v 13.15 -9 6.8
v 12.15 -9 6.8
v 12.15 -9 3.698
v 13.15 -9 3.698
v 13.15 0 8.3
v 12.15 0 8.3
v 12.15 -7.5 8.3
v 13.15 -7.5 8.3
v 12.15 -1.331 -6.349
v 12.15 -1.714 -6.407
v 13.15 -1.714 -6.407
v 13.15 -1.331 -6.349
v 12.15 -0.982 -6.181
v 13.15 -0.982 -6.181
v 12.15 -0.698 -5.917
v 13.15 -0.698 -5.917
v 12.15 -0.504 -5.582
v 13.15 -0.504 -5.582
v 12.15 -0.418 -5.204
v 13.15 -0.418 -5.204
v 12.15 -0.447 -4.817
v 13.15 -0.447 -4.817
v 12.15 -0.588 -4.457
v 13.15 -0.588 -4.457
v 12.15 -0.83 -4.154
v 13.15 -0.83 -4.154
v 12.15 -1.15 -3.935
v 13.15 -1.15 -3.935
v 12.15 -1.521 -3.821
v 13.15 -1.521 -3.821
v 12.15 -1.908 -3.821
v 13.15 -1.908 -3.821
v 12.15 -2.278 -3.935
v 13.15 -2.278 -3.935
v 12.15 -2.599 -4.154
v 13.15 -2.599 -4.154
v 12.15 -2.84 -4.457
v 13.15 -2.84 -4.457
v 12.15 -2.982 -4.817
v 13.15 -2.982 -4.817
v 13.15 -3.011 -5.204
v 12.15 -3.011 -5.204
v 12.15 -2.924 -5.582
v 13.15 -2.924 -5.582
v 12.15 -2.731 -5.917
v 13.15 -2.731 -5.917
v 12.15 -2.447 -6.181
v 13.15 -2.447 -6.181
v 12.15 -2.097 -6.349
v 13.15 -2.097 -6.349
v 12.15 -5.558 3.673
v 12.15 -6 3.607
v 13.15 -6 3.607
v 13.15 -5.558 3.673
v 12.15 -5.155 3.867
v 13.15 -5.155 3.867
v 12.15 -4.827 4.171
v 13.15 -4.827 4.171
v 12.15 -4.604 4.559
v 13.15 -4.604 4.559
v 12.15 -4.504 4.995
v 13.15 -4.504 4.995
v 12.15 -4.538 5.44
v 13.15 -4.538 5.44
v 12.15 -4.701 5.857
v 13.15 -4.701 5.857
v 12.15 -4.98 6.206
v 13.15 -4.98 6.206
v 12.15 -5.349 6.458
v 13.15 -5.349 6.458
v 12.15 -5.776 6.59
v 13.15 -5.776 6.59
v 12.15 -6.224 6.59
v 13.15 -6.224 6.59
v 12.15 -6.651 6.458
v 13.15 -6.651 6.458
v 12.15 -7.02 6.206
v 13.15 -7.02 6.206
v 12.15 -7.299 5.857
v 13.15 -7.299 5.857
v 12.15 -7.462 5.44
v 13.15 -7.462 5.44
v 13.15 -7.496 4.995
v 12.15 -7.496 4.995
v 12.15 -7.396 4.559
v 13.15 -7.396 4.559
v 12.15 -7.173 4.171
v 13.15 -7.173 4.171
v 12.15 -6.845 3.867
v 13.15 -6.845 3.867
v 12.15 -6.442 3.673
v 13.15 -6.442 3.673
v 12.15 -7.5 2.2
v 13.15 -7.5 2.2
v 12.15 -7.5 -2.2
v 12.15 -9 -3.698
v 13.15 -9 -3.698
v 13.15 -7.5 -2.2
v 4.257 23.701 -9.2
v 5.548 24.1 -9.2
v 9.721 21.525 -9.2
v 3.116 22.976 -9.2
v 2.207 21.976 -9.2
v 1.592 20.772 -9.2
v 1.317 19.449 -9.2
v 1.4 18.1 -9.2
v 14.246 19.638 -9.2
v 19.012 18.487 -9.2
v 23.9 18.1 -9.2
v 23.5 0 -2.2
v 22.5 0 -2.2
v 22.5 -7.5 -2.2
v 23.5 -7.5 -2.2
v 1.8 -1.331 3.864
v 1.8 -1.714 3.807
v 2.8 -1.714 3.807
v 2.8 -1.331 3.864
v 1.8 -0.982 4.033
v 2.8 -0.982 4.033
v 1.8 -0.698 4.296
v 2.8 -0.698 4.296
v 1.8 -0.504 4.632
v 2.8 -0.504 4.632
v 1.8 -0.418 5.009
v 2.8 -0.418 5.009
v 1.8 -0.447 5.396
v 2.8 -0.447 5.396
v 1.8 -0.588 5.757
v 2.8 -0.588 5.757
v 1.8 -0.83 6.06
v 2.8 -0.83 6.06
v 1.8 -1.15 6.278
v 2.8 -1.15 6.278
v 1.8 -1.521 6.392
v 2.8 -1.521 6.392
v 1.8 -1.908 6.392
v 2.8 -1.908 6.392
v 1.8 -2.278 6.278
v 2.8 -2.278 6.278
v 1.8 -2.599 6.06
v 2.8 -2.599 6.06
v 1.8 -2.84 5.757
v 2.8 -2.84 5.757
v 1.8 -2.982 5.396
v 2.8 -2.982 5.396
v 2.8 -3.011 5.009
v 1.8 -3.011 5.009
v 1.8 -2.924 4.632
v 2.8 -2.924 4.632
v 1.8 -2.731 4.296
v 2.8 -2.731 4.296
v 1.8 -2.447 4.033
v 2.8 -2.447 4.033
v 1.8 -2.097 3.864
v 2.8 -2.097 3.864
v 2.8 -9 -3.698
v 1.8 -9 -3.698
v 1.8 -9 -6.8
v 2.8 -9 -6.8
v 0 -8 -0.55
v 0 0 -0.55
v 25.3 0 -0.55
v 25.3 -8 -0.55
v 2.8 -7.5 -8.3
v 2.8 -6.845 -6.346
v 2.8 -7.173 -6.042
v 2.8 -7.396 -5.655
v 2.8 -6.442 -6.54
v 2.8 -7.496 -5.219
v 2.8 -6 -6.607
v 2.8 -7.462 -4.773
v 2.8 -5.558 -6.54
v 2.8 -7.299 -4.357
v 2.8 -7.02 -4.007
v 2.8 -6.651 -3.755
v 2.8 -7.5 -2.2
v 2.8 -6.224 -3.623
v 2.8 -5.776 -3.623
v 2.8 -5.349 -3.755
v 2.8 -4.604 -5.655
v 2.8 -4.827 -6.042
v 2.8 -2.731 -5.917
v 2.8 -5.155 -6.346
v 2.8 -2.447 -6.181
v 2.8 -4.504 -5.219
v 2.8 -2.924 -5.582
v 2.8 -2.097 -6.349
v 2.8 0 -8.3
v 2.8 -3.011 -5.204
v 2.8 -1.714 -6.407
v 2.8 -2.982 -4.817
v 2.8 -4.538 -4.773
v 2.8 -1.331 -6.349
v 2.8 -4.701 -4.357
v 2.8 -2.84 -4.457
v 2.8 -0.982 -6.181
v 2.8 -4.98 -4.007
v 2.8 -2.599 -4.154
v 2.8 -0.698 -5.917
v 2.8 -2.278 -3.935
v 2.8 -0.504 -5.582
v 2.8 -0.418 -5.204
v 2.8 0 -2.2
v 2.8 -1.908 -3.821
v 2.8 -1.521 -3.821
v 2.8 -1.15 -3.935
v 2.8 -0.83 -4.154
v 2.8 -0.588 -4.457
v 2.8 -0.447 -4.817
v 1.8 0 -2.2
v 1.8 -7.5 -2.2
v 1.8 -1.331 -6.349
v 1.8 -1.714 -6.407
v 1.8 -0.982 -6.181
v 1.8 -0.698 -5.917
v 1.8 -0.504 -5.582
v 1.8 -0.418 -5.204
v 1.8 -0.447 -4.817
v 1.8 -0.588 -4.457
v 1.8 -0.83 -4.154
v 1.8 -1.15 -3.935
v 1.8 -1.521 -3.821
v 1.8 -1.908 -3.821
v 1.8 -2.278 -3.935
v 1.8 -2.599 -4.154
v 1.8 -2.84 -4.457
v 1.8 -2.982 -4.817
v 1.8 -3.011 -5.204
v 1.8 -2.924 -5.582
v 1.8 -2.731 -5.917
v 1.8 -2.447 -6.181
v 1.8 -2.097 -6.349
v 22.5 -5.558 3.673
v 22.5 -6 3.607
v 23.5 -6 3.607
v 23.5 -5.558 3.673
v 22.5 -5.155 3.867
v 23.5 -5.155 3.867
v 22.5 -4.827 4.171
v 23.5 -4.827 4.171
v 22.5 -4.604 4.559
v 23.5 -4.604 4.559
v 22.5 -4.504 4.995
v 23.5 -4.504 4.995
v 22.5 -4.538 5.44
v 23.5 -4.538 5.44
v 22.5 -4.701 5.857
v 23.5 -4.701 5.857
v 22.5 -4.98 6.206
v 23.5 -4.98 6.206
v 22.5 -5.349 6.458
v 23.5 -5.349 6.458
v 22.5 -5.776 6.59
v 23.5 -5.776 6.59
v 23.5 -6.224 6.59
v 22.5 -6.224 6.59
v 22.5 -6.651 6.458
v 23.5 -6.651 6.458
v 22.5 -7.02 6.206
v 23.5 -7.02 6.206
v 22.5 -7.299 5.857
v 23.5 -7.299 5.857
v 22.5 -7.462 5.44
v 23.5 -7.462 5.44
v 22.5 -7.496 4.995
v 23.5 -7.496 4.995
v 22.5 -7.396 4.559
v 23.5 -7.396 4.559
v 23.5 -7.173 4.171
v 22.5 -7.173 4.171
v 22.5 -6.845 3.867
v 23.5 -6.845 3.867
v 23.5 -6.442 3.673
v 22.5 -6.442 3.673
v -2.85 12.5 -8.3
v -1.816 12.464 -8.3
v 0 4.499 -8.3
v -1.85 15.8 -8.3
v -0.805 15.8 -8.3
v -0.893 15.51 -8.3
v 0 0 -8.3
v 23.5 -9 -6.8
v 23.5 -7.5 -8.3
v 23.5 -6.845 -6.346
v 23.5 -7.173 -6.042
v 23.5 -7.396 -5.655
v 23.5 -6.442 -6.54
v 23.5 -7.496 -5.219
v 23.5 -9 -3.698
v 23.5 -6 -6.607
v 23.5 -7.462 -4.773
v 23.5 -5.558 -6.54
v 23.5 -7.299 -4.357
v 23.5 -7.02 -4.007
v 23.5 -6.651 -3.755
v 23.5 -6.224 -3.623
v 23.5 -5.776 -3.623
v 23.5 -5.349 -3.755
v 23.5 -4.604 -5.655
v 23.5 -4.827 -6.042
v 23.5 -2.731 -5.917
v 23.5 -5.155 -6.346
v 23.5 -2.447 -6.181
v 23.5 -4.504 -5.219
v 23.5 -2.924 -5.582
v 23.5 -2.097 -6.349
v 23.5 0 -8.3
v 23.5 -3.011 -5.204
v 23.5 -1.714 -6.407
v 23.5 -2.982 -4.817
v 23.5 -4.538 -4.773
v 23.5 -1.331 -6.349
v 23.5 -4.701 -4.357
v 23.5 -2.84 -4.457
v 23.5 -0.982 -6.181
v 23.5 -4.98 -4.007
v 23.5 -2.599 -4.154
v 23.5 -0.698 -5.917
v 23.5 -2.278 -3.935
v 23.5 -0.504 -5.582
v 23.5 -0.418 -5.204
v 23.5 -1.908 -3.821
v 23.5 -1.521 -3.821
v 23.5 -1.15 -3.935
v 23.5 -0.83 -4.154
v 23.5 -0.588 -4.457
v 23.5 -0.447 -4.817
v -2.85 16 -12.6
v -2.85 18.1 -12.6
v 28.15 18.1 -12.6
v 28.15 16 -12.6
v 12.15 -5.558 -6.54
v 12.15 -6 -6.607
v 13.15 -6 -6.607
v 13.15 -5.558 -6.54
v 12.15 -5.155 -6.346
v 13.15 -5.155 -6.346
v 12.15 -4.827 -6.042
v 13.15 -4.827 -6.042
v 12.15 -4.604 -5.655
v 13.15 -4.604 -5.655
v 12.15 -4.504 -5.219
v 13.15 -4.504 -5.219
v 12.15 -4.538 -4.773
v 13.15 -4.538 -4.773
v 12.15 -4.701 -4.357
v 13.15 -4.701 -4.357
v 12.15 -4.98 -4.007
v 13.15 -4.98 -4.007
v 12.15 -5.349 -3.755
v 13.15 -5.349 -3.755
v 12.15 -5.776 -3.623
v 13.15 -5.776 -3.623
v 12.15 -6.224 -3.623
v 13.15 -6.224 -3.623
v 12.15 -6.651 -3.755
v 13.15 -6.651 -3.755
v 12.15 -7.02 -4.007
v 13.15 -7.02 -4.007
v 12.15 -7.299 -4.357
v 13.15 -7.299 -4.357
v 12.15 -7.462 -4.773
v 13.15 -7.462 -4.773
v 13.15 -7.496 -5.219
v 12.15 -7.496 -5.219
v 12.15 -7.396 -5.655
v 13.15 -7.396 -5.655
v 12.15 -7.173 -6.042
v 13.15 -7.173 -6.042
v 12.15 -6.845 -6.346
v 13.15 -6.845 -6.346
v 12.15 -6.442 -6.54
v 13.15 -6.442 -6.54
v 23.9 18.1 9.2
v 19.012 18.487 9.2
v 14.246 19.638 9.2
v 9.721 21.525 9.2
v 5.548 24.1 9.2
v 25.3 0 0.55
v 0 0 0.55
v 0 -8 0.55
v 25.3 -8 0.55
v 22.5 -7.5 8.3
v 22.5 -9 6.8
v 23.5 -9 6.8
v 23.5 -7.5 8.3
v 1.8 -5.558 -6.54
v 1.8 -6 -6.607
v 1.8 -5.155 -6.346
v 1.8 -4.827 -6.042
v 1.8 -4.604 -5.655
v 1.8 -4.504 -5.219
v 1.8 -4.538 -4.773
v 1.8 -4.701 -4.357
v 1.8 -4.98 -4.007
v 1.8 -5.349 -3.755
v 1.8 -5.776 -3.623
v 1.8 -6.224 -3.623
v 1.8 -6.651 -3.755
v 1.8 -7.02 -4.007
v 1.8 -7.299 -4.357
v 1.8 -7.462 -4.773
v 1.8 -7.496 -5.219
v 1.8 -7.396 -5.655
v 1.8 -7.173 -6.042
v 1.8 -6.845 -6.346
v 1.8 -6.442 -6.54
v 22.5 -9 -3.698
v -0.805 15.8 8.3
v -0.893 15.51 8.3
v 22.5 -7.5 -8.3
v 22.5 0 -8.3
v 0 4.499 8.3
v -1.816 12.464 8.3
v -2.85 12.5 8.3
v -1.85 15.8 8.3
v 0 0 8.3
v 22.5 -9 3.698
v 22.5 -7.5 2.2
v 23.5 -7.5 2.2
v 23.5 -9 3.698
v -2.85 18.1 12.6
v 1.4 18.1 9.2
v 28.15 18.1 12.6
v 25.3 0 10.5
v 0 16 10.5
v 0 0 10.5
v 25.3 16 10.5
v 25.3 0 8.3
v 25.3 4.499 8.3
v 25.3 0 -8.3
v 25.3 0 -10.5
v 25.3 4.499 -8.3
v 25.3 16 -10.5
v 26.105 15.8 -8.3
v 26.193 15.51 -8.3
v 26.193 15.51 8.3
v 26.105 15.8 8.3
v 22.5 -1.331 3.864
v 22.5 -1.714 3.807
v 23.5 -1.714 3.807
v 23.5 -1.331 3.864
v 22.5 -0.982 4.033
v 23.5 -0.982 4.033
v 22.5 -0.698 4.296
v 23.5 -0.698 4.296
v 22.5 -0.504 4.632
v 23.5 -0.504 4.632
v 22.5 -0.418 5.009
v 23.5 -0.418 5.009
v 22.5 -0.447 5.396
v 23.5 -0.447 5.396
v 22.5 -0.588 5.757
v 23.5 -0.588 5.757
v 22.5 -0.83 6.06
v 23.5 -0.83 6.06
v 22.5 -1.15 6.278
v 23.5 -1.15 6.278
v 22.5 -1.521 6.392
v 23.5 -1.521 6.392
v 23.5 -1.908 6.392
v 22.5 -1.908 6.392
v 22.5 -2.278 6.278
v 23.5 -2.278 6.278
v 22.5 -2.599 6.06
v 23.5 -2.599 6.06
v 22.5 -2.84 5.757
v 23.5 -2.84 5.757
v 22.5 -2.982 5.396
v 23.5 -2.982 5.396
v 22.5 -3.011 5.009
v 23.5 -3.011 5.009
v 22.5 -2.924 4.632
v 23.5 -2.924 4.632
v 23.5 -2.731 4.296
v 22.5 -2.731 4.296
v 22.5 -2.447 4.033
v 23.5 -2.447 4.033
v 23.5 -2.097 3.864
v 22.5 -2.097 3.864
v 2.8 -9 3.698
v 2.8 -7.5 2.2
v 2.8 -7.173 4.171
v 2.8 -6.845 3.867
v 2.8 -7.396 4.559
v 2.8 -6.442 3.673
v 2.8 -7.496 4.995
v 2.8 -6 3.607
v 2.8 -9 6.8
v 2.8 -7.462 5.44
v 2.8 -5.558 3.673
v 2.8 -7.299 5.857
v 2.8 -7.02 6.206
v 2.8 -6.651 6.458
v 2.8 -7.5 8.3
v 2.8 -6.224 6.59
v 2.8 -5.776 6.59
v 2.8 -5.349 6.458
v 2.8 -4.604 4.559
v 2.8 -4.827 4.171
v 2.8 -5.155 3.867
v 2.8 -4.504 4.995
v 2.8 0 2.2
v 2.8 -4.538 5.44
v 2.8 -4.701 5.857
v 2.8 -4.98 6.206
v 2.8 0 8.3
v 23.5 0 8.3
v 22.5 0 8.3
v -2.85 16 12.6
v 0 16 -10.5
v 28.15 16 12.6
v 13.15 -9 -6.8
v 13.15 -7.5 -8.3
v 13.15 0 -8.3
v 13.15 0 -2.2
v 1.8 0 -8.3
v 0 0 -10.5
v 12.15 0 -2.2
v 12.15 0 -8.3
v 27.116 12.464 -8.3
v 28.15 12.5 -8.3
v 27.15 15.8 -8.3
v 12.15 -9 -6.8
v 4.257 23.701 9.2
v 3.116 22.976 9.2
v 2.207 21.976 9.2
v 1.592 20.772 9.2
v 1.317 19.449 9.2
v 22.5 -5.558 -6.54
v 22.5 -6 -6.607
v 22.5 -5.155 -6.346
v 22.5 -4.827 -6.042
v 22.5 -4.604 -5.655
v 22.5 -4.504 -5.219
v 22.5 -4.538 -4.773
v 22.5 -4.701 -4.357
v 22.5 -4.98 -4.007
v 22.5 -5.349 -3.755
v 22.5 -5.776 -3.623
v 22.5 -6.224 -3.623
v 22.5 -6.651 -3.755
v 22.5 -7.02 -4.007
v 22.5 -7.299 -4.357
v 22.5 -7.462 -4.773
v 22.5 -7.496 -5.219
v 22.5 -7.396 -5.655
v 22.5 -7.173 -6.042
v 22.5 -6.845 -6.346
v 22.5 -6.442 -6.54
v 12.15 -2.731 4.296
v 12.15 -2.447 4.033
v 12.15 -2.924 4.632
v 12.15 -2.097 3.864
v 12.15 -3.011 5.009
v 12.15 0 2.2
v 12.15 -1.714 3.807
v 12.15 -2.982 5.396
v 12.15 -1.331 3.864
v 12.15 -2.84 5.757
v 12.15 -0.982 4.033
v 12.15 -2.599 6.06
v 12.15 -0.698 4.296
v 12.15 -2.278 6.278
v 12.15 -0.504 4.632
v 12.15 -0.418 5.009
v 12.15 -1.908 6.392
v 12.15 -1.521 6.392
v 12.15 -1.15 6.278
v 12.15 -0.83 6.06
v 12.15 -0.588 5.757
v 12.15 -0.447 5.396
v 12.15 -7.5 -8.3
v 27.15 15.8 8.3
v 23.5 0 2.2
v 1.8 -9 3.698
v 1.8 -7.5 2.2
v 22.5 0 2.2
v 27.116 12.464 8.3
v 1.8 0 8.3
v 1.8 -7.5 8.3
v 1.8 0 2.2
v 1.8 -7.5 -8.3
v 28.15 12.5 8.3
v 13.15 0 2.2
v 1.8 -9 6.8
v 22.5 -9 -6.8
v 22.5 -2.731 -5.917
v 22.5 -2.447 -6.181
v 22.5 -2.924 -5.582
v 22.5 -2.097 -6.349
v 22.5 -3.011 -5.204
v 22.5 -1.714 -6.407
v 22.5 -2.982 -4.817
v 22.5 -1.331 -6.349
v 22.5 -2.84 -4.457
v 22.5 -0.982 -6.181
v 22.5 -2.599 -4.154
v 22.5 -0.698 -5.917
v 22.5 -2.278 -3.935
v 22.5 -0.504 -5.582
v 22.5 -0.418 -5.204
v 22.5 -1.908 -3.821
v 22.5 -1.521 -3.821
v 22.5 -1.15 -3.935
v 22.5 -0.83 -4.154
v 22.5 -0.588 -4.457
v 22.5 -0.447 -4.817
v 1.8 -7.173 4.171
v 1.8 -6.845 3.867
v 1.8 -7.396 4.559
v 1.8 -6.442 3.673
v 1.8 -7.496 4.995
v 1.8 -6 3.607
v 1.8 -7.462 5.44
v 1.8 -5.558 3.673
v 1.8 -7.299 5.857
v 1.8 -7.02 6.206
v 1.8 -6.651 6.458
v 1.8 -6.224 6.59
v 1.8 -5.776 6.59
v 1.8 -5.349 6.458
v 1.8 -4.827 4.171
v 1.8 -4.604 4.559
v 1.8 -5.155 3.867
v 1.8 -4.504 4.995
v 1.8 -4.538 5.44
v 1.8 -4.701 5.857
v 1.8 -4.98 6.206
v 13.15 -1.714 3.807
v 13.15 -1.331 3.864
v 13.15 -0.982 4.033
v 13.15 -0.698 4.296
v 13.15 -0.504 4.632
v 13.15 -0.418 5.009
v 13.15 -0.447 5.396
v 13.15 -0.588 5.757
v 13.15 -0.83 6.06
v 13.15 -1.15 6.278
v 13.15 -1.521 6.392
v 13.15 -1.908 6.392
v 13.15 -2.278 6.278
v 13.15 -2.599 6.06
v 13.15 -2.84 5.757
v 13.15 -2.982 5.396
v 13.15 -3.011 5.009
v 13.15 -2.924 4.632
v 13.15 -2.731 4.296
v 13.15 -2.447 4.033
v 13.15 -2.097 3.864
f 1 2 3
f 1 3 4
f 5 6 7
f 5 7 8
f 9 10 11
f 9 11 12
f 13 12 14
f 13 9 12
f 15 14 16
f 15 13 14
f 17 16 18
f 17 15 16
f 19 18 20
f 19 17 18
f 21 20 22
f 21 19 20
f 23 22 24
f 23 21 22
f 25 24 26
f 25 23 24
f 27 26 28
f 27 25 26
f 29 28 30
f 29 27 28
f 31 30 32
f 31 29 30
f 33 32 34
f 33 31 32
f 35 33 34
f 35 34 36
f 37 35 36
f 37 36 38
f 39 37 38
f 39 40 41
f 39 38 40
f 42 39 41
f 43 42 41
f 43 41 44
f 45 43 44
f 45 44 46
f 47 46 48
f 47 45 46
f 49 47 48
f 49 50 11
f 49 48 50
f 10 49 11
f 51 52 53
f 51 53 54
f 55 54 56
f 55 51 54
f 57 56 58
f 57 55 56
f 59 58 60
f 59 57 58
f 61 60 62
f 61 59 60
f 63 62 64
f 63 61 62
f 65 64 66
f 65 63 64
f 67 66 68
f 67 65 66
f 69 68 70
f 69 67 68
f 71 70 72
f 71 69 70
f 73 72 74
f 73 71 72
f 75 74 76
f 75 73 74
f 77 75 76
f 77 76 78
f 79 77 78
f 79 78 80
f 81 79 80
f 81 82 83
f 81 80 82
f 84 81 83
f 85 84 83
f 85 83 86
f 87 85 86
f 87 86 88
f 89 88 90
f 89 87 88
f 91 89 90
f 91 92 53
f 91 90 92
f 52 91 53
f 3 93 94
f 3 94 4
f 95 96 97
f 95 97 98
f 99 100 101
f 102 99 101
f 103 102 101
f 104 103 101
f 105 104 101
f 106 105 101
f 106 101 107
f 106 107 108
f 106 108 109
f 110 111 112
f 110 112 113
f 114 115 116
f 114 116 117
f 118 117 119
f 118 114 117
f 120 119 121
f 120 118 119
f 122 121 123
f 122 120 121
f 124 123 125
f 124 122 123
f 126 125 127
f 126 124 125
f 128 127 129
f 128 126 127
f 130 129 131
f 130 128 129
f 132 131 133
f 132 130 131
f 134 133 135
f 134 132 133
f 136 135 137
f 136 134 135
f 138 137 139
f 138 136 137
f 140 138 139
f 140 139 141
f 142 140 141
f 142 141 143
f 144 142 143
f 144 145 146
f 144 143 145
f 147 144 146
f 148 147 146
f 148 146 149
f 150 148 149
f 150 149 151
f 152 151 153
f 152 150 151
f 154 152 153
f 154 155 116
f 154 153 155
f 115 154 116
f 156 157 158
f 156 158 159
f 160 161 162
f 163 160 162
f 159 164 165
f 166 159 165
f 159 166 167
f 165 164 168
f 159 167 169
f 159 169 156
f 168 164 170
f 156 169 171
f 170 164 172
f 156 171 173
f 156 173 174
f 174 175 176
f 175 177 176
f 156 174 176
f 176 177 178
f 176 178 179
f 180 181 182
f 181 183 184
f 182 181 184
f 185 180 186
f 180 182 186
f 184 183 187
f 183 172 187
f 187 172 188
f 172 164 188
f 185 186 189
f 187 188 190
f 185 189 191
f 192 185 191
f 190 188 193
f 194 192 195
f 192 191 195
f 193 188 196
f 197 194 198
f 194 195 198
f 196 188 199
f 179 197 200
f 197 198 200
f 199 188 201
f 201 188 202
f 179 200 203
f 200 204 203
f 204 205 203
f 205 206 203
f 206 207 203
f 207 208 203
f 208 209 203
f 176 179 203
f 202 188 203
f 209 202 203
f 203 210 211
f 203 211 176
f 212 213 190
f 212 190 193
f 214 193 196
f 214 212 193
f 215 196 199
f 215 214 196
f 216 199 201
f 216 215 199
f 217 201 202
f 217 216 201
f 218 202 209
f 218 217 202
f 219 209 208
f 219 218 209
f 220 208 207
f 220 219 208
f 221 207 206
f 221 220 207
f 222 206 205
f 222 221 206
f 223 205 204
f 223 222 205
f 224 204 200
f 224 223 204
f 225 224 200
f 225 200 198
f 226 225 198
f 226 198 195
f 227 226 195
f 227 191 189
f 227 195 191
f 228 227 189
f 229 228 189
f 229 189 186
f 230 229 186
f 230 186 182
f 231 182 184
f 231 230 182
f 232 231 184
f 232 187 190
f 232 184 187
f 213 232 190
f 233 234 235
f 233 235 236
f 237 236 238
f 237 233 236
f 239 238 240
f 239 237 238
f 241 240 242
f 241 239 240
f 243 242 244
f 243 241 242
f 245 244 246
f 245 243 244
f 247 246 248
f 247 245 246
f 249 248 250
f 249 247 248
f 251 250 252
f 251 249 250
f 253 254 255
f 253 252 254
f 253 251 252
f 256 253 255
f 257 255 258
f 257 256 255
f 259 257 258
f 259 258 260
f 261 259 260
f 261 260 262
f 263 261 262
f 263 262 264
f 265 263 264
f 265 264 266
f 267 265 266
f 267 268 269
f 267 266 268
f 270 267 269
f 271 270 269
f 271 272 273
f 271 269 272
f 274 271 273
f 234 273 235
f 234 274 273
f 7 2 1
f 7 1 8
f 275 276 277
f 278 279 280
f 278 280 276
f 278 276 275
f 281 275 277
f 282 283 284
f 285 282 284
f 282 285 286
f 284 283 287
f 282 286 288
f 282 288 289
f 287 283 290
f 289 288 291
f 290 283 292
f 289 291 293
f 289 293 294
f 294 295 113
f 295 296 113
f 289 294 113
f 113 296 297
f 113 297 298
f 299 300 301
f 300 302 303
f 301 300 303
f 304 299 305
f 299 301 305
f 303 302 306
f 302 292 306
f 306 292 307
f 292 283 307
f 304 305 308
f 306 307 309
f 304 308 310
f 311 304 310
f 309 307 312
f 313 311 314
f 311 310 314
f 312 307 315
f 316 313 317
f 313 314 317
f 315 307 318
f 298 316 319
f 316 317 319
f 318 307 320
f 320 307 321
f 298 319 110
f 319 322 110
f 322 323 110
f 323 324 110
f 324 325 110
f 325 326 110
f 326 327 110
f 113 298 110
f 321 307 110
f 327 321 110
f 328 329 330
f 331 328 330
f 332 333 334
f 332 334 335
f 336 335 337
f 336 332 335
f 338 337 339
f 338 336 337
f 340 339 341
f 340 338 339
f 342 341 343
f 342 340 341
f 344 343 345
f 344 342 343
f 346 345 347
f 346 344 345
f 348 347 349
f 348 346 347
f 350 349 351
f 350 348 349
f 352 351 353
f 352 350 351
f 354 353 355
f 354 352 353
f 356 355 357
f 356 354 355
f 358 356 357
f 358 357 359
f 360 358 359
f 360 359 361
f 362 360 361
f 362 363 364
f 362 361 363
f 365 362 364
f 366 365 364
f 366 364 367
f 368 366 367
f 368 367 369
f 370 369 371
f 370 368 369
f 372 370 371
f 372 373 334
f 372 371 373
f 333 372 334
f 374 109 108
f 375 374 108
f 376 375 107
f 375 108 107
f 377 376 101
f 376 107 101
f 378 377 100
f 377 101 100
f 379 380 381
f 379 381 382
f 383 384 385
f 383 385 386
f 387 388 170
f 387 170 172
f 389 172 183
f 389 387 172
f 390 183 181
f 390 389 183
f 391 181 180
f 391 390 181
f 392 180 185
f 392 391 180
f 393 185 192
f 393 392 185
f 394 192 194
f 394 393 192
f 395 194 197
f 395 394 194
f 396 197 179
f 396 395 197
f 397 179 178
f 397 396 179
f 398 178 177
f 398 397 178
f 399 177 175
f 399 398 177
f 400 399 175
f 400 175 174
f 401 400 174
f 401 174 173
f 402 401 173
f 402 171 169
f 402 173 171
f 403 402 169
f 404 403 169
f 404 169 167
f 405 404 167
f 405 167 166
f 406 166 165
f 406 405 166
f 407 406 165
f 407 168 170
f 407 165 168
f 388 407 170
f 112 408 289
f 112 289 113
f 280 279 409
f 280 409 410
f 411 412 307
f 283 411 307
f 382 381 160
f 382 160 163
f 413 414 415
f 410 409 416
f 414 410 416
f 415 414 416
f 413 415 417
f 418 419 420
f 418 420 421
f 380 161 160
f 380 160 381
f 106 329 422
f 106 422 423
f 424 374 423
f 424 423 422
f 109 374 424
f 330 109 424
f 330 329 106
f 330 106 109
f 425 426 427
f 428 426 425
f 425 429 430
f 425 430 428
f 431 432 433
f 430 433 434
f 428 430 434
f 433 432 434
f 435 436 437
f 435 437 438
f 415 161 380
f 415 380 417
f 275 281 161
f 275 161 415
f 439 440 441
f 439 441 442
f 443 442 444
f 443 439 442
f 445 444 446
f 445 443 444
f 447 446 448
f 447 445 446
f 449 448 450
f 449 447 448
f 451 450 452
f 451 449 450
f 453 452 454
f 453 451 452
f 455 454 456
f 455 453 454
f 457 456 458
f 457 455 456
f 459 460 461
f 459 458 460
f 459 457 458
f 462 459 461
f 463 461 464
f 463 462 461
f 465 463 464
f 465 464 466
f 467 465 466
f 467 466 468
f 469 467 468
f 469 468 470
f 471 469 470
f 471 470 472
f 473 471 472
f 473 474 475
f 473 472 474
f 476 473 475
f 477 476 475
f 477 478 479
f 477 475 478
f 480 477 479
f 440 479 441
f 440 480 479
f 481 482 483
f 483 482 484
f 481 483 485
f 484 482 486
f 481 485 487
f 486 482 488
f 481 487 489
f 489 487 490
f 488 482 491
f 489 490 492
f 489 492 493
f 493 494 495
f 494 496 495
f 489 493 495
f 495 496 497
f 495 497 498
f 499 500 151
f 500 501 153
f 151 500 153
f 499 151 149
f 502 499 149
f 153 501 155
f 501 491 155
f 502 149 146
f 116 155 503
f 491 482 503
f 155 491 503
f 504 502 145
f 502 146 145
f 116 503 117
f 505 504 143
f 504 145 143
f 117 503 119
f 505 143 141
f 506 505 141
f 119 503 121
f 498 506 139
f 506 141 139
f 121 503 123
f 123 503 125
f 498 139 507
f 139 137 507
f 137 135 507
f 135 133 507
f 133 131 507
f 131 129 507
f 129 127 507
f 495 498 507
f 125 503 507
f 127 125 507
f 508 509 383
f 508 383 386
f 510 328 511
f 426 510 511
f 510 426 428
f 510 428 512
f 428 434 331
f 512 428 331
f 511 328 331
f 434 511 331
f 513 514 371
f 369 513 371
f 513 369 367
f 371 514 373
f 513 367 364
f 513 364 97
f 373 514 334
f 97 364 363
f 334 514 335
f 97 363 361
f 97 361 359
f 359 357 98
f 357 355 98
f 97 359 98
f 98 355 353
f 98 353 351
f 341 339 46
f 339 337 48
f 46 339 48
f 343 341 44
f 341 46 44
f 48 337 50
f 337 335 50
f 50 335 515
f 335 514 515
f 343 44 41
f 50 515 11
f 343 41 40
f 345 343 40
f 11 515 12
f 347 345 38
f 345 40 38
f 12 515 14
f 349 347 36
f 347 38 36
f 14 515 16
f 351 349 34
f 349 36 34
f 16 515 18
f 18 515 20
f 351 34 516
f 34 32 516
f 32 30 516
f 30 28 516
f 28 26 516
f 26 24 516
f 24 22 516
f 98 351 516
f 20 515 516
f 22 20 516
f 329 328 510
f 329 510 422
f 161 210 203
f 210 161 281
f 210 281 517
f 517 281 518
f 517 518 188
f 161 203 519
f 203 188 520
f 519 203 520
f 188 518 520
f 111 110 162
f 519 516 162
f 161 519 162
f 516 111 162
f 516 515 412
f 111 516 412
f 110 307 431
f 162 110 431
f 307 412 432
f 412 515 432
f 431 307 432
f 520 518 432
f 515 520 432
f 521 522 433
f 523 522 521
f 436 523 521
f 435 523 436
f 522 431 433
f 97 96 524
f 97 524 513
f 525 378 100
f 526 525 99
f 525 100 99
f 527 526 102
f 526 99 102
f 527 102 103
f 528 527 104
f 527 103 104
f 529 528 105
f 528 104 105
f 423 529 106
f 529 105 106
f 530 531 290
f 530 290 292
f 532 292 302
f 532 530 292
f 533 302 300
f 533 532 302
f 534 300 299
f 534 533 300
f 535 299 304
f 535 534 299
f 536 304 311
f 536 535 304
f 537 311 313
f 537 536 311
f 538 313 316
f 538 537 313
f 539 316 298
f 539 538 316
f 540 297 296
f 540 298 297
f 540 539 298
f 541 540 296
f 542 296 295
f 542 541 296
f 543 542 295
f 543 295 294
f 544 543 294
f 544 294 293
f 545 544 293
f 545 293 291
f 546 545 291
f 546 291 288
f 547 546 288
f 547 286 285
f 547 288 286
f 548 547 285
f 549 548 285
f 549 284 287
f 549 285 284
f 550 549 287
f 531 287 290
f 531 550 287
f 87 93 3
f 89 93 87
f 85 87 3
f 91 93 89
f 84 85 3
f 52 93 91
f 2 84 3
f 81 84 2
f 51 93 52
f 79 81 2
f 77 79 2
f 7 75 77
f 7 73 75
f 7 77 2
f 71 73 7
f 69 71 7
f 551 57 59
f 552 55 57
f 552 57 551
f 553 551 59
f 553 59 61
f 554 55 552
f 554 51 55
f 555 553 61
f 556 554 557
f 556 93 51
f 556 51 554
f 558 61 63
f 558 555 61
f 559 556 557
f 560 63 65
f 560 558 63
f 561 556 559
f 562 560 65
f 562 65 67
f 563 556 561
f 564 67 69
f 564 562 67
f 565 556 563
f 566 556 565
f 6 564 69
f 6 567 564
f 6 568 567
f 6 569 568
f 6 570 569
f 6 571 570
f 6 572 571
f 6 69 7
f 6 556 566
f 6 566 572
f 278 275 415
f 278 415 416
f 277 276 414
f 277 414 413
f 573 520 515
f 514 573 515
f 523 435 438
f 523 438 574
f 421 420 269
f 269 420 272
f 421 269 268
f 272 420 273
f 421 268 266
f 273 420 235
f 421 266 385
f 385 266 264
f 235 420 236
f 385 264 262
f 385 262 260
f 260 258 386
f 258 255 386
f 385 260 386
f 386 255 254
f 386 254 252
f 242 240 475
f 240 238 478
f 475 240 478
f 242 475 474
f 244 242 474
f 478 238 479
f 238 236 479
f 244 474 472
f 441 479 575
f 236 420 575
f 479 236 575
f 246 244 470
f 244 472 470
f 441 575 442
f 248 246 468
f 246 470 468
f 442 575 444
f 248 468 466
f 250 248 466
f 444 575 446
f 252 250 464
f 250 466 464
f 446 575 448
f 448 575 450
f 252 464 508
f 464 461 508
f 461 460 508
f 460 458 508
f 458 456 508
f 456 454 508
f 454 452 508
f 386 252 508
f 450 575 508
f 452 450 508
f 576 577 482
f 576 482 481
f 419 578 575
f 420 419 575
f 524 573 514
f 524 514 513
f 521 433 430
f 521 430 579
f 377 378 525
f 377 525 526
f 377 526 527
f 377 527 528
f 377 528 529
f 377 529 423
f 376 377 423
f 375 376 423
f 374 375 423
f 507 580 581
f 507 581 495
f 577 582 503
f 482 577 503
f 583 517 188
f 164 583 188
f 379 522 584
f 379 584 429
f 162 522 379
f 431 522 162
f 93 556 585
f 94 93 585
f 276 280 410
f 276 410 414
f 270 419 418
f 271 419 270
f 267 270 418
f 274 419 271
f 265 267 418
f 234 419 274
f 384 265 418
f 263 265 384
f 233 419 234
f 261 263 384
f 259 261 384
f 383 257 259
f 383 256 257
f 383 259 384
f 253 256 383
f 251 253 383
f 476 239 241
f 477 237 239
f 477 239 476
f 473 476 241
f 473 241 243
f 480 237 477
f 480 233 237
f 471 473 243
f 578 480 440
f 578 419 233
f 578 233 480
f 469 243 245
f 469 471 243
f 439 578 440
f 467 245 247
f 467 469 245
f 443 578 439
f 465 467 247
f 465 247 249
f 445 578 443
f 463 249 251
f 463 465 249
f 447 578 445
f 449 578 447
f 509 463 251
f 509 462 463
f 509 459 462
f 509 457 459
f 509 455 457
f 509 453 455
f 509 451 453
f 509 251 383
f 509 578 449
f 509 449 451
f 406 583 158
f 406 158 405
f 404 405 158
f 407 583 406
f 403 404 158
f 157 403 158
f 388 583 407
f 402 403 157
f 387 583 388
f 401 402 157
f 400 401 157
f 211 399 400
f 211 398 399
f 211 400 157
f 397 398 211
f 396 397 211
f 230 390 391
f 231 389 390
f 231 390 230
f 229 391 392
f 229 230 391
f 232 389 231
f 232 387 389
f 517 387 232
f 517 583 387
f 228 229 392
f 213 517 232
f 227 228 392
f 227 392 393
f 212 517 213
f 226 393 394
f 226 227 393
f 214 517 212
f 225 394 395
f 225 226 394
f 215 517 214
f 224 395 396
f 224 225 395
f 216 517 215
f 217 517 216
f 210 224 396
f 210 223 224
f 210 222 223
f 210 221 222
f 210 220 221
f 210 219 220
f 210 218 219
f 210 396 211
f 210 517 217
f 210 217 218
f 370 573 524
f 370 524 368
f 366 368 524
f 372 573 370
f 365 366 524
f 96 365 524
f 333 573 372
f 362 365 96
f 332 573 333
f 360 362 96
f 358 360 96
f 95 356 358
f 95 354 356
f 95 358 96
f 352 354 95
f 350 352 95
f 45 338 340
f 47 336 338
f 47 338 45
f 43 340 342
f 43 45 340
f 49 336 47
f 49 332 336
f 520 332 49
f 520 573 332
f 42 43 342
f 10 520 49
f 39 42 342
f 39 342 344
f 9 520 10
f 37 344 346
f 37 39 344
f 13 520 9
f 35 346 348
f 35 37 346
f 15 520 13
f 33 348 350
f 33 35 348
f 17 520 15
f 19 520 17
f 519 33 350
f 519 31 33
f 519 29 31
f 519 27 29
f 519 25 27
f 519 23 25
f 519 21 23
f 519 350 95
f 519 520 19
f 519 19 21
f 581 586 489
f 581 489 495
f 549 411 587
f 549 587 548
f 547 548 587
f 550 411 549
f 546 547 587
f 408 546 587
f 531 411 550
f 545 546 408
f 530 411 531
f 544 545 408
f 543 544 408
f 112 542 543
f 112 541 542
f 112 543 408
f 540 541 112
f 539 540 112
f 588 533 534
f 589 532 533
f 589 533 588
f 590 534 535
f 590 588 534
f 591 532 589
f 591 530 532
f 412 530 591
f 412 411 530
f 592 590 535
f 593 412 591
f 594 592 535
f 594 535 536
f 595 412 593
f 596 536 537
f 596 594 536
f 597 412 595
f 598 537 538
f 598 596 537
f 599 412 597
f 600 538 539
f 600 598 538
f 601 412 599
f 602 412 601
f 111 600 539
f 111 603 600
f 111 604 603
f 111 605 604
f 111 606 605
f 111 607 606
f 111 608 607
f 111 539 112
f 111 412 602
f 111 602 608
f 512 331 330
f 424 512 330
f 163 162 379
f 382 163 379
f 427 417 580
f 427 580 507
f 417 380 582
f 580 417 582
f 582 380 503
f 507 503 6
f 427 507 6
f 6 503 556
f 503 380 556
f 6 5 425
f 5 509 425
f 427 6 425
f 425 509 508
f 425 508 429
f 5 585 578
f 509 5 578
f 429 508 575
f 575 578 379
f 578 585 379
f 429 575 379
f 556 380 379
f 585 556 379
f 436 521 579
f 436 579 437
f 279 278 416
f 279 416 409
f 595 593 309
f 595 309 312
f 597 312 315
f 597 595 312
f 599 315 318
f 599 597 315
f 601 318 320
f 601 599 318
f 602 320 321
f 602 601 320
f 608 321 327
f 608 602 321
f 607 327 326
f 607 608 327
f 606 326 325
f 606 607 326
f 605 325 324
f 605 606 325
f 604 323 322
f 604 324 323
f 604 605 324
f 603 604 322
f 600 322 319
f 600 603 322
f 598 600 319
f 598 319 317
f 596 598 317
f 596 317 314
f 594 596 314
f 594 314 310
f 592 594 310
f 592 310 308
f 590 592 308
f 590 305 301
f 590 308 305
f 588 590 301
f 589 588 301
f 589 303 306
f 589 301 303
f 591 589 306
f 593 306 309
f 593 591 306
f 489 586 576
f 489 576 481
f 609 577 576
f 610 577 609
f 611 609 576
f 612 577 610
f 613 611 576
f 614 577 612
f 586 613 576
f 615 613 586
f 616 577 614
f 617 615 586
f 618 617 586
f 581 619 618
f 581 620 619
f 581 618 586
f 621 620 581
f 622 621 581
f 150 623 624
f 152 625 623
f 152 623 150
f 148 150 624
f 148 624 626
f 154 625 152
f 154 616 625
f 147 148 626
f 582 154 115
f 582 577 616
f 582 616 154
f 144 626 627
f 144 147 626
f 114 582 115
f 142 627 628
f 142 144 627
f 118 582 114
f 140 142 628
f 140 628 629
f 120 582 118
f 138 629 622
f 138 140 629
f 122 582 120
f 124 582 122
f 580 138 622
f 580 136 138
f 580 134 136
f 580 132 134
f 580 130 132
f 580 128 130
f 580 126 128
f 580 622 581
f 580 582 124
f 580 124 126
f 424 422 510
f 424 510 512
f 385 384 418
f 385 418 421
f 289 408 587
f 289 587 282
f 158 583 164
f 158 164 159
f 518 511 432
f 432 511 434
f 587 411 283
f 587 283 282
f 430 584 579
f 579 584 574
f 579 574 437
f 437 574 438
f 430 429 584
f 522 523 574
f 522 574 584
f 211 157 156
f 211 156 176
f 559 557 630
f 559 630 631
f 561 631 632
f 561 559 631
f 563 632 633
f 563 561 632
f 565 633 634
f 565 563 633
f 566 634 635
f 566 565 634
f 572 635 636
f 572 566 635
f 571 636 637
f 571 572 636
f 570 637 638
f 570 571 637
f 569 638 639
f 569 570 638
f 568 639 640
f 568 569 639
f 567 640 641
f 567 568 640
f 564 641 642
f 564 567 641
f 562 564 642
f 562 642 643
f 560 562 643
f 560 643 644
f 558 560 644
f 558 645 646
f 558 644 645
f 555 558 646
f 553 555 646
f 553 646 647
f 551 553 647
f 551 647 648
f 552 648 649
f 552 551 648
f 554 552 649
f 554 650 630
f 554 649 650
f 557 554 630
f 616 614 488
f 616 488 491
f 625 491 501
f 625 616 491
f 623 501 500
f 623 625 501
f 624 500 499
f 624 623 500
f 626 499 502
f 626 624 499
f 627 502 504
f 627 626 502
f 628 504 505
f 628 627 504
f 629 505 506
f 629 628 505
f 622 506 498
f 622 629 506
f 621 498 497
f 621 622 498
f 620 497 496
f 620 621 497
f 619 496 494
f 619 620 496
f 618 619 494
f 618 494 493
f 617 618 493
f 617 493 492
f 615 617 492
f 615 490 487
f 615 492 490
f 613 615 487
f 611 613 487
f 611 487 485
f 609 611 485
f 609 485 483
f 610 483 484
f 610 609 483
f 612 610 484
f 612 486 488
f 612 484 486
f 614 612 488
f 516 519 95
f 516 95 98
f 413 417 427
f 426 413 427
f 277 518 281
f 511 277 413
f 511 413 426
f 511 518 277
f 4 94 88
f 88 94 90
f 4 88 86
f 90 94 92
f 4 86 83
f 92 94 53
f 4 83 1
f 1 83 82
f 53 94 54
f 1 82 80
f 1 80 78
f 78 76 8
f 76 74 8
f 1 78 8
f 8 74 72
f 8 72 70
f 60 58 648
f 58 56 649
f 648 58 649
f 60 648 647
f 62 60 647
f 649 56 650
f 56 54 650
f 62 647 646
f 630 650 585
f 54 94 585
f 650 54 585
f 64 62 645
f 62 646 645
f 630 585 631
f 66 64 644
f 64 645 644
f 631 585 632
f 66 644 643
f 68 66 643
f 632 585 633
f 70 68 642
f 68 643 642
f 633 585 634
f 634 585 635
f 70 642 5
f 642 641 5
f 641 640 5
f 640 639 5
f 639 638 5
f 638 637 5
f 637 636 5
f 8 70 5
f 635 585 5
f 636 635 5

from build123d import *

# Parameters (mm, degrees)
EXTRUDE_1_DEPTH          = 10.5
EXTRUDE_1_DEPTH_BACK     = 10.5
SKETCH_1_W               = 25.3
SKETCH_1_H               = 16
EXTRUDE_2_DEPTH          = 12.6
EXTRUDE_2_DEPTH_BACK     = 12.6
SKETCH_2_W               = 31
SKETCH_2_H               = 2.1
EXTRUDE_3_DEPTH          = 9.2
EXTRUDE_3_DEPTH_BACK     = 9.2
EXTRUDE_4_DEPTH          = 8.3
EXTRUDE_4_DEPTH_BACK     = 8.3
SKETCH_5_W               = 1
SKETCH_5_H               = 6.1
EXTRUDE_5_DEPTH          = 9
SKETCH_6_W               = 25.3
SKETCH_6_H               = 1.1
EXTRUDE_6_DEPTH          = 8
CUT_EXTRUDE_1_DEPTH      = 38.866773034
CUT_EXTRUDE_1_DEPTH_BACK = 38.866773034
SKETCH_7_R               = 1.5
SKETCH_7_R_2             = 1.3


with BuildPart() as part:
    # 草图1 → 凸台-拉伸1 (new, two sides: drawn at the far end of the back side and taken through both)
    with BuildSketch(Plane.XY.offset(-EXTRUDE_1_DEPTH_BACK)):
        with Locations((12.65, 8)):
            Rectangle(SKETCH_1_W, SKETCH_1_H)
    extrude(amount=EXTRUDE_1_DEPTH + EXTRUDE_1_DEPTH_BACK)

    # 草图2 → 凸台-拉伸2 (add, two sides: drawn at the far end of the back side and taken through both)
    with BuildSketch(Plane.XY.offset(-EXTRUDE_2_DEPTH_BACK)):
        with Locations((12.65, 17.05)):
            Rectangle(SKETCH_2_W, SKETCH_2_H)
    extrude(amount=EXTRUDE_2_DEPTH + EXTRUDE_2_DEPTH_BACK)

    # 草图3 → 凸台-拉伸3 (add, two sides: drawn at the far end of the back side and taken through both)
    with BuildSketch(Plane.XY.offset(-EXTRUDE_3_DEPTH_BACK)):
        with BuildLine():
            Line((1.4, 18.1), (23.9, 18.1))
            ThreePointArc((23.9, 18.1), (14.246241567, 19.638076247), (5.548427655, 24.1))
            ThreePointArc((5.548427655, 24.1), (2.206514702, 21.976493018), (1.4, 18.1))
        make_face()
    extrude(amount=EXTRUDE_3_DEPTH + EXTRUDE_3_DEPTH_BACK)

    # 草图4 → 凸台-拉伸4 (add, two sides: drawn at the far end of the back side and taken through both)
    with BuildSketch(Plane.XY.offset(-EXTRUDE_4_DEPTH_BACK)):
        Polygon((0, 0), (-2.85, 12.5), (-1.85, 15.8), (-0.805094567, 15.8), (-0.892975596, 15.509992605), (-1.816075348, 12.463763423), (0, 4.498520669), align=None)
        Polygon((25.3, 0), (25.3, 4.498520669), (27.116075348, 12.463763423), (26.192975596, 15.509992605), (26.105094567, 15.8), (27.15, 15.8), (28.15, 12.5), align=None)
    extrude(amount=EXTRUDE_4_DEPTH + EXTRUDE_4_DEPTH_BACK)

    # 草图5 → 凸台-拉伸5 (add)
    with BuildSketch(Plane.XZ):
        with Locations((23, -5.25)):
            Rectangle(SKETCH_5_W, SKETCH_5_H)
        with Locations((12.65, -5.25)):
            Rectangle(SKETCH_5_W, SKETCH_5_H)
        with Locations((2.3, -5.25)):
            Rectangle(SKETCH_5_W, SKETCH_5_H)
        with Locations((2.3, 5.25)):
            Rectangle(SKETCH_5_W, SKETCH_5_H)
        with Locations((12.65, 5.25)):
            Rectangle(SKETCH_5_W, SKETCH_5_H)
        with Locations((23, 5.25)):
            Rectangle(SKETCH_5_W, SKETCH_5_H)
    extrude(amount=EXTRUDE_5_DEPTH)

    # 草图6 → 凸台-拉伸6 (add)
    with BuildSketch(Plane.XZ):
        with Locations((12.65, 0)):
            Rectangle(SKETCH_6_W, SKETCH_6_H)
    extrude(amount=EXTRUDE_6_DEPTH)

    # 草图7 → 切除-拉伸1 (cut, two sides: drawn at the far end of the back side and taken through both)
    with BuildSketch(Plane(origin=(23.5, 0, 0), x_dir=(0, 0, -1), z_dir=(1, 0, 0)).offset(-CUT_EXTRUDE_1_DEPTH_BACK)):
        with Locations((-5.106619867, -6)):
            Circle(SKETCH_7_R)
        with Locations((-5.106619867, -1.714294339)):
            Circle(SKETCH_7_R_2)
        Polygon((-6.8, -9), (-8.3, -7.5), (-8.3, -9), align=None)
        Polygon((2.2, -7.5), (2.2, -9), (3.697628314, -9), align=None)
        Polygon((-2.2, -7.5), (-3.697628314, -9), (-2.2, -9), align=None)
        Polygon((8.3, -7.5), (6.8, -9), (8.3, -9), align=None)
        with Locations((5.106619867, -6)):
            Circle(SKETCH_7_R)
        with Locations((5.106619867, -1.714294339)):
            Circle(SKETCH_7_R_2)
    extrude(amount=CUT_EXTRUDE_1_DEPTH + CUT_EXTRUDE_1_DEPTH_BACK, mode=Mode.SUBTRACT)


solid = part.part
